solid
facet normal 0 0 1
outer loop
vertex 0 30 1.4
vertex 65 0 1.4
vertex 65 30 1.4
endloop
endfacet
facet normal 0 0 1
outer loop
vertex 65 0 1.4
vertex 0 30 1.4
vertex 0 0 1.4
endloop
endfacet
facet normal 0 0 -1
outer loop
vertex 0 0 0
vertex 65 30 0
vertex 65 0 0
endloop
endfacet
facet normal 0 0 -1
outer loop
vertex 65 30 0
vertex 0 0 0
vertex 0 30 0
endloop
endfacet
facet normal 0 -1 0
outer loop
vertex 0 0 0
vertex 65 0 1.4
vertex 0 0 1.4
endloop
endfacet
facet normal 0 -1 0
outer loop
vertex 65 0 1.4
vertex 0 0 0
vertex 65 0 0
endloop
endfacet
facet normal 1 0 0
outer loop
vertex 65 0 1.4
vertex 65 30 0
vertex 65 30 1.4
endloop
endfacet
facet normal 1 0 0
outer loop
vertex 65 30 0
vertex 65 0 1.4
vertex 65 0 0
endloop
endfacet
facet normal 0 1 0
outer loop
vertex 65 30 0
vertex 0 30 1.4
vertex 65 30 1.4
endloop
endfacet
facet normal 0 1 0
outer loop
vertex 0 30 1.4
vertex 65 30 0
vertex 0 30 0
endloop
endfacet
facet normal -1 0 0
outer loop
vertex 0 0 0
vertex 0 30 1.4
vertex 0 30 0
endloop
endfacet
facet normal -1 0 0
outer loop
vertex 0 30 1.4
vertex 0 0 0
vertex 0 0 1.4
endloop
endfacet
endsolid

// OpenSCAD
$fn=64;

board_length = 65.0;
board_width  = 30.0;
board_thick  = 1.4;

color([0.05, 0.45, 0.15])
cube([board_length, board_width, board_thick], center=false);
